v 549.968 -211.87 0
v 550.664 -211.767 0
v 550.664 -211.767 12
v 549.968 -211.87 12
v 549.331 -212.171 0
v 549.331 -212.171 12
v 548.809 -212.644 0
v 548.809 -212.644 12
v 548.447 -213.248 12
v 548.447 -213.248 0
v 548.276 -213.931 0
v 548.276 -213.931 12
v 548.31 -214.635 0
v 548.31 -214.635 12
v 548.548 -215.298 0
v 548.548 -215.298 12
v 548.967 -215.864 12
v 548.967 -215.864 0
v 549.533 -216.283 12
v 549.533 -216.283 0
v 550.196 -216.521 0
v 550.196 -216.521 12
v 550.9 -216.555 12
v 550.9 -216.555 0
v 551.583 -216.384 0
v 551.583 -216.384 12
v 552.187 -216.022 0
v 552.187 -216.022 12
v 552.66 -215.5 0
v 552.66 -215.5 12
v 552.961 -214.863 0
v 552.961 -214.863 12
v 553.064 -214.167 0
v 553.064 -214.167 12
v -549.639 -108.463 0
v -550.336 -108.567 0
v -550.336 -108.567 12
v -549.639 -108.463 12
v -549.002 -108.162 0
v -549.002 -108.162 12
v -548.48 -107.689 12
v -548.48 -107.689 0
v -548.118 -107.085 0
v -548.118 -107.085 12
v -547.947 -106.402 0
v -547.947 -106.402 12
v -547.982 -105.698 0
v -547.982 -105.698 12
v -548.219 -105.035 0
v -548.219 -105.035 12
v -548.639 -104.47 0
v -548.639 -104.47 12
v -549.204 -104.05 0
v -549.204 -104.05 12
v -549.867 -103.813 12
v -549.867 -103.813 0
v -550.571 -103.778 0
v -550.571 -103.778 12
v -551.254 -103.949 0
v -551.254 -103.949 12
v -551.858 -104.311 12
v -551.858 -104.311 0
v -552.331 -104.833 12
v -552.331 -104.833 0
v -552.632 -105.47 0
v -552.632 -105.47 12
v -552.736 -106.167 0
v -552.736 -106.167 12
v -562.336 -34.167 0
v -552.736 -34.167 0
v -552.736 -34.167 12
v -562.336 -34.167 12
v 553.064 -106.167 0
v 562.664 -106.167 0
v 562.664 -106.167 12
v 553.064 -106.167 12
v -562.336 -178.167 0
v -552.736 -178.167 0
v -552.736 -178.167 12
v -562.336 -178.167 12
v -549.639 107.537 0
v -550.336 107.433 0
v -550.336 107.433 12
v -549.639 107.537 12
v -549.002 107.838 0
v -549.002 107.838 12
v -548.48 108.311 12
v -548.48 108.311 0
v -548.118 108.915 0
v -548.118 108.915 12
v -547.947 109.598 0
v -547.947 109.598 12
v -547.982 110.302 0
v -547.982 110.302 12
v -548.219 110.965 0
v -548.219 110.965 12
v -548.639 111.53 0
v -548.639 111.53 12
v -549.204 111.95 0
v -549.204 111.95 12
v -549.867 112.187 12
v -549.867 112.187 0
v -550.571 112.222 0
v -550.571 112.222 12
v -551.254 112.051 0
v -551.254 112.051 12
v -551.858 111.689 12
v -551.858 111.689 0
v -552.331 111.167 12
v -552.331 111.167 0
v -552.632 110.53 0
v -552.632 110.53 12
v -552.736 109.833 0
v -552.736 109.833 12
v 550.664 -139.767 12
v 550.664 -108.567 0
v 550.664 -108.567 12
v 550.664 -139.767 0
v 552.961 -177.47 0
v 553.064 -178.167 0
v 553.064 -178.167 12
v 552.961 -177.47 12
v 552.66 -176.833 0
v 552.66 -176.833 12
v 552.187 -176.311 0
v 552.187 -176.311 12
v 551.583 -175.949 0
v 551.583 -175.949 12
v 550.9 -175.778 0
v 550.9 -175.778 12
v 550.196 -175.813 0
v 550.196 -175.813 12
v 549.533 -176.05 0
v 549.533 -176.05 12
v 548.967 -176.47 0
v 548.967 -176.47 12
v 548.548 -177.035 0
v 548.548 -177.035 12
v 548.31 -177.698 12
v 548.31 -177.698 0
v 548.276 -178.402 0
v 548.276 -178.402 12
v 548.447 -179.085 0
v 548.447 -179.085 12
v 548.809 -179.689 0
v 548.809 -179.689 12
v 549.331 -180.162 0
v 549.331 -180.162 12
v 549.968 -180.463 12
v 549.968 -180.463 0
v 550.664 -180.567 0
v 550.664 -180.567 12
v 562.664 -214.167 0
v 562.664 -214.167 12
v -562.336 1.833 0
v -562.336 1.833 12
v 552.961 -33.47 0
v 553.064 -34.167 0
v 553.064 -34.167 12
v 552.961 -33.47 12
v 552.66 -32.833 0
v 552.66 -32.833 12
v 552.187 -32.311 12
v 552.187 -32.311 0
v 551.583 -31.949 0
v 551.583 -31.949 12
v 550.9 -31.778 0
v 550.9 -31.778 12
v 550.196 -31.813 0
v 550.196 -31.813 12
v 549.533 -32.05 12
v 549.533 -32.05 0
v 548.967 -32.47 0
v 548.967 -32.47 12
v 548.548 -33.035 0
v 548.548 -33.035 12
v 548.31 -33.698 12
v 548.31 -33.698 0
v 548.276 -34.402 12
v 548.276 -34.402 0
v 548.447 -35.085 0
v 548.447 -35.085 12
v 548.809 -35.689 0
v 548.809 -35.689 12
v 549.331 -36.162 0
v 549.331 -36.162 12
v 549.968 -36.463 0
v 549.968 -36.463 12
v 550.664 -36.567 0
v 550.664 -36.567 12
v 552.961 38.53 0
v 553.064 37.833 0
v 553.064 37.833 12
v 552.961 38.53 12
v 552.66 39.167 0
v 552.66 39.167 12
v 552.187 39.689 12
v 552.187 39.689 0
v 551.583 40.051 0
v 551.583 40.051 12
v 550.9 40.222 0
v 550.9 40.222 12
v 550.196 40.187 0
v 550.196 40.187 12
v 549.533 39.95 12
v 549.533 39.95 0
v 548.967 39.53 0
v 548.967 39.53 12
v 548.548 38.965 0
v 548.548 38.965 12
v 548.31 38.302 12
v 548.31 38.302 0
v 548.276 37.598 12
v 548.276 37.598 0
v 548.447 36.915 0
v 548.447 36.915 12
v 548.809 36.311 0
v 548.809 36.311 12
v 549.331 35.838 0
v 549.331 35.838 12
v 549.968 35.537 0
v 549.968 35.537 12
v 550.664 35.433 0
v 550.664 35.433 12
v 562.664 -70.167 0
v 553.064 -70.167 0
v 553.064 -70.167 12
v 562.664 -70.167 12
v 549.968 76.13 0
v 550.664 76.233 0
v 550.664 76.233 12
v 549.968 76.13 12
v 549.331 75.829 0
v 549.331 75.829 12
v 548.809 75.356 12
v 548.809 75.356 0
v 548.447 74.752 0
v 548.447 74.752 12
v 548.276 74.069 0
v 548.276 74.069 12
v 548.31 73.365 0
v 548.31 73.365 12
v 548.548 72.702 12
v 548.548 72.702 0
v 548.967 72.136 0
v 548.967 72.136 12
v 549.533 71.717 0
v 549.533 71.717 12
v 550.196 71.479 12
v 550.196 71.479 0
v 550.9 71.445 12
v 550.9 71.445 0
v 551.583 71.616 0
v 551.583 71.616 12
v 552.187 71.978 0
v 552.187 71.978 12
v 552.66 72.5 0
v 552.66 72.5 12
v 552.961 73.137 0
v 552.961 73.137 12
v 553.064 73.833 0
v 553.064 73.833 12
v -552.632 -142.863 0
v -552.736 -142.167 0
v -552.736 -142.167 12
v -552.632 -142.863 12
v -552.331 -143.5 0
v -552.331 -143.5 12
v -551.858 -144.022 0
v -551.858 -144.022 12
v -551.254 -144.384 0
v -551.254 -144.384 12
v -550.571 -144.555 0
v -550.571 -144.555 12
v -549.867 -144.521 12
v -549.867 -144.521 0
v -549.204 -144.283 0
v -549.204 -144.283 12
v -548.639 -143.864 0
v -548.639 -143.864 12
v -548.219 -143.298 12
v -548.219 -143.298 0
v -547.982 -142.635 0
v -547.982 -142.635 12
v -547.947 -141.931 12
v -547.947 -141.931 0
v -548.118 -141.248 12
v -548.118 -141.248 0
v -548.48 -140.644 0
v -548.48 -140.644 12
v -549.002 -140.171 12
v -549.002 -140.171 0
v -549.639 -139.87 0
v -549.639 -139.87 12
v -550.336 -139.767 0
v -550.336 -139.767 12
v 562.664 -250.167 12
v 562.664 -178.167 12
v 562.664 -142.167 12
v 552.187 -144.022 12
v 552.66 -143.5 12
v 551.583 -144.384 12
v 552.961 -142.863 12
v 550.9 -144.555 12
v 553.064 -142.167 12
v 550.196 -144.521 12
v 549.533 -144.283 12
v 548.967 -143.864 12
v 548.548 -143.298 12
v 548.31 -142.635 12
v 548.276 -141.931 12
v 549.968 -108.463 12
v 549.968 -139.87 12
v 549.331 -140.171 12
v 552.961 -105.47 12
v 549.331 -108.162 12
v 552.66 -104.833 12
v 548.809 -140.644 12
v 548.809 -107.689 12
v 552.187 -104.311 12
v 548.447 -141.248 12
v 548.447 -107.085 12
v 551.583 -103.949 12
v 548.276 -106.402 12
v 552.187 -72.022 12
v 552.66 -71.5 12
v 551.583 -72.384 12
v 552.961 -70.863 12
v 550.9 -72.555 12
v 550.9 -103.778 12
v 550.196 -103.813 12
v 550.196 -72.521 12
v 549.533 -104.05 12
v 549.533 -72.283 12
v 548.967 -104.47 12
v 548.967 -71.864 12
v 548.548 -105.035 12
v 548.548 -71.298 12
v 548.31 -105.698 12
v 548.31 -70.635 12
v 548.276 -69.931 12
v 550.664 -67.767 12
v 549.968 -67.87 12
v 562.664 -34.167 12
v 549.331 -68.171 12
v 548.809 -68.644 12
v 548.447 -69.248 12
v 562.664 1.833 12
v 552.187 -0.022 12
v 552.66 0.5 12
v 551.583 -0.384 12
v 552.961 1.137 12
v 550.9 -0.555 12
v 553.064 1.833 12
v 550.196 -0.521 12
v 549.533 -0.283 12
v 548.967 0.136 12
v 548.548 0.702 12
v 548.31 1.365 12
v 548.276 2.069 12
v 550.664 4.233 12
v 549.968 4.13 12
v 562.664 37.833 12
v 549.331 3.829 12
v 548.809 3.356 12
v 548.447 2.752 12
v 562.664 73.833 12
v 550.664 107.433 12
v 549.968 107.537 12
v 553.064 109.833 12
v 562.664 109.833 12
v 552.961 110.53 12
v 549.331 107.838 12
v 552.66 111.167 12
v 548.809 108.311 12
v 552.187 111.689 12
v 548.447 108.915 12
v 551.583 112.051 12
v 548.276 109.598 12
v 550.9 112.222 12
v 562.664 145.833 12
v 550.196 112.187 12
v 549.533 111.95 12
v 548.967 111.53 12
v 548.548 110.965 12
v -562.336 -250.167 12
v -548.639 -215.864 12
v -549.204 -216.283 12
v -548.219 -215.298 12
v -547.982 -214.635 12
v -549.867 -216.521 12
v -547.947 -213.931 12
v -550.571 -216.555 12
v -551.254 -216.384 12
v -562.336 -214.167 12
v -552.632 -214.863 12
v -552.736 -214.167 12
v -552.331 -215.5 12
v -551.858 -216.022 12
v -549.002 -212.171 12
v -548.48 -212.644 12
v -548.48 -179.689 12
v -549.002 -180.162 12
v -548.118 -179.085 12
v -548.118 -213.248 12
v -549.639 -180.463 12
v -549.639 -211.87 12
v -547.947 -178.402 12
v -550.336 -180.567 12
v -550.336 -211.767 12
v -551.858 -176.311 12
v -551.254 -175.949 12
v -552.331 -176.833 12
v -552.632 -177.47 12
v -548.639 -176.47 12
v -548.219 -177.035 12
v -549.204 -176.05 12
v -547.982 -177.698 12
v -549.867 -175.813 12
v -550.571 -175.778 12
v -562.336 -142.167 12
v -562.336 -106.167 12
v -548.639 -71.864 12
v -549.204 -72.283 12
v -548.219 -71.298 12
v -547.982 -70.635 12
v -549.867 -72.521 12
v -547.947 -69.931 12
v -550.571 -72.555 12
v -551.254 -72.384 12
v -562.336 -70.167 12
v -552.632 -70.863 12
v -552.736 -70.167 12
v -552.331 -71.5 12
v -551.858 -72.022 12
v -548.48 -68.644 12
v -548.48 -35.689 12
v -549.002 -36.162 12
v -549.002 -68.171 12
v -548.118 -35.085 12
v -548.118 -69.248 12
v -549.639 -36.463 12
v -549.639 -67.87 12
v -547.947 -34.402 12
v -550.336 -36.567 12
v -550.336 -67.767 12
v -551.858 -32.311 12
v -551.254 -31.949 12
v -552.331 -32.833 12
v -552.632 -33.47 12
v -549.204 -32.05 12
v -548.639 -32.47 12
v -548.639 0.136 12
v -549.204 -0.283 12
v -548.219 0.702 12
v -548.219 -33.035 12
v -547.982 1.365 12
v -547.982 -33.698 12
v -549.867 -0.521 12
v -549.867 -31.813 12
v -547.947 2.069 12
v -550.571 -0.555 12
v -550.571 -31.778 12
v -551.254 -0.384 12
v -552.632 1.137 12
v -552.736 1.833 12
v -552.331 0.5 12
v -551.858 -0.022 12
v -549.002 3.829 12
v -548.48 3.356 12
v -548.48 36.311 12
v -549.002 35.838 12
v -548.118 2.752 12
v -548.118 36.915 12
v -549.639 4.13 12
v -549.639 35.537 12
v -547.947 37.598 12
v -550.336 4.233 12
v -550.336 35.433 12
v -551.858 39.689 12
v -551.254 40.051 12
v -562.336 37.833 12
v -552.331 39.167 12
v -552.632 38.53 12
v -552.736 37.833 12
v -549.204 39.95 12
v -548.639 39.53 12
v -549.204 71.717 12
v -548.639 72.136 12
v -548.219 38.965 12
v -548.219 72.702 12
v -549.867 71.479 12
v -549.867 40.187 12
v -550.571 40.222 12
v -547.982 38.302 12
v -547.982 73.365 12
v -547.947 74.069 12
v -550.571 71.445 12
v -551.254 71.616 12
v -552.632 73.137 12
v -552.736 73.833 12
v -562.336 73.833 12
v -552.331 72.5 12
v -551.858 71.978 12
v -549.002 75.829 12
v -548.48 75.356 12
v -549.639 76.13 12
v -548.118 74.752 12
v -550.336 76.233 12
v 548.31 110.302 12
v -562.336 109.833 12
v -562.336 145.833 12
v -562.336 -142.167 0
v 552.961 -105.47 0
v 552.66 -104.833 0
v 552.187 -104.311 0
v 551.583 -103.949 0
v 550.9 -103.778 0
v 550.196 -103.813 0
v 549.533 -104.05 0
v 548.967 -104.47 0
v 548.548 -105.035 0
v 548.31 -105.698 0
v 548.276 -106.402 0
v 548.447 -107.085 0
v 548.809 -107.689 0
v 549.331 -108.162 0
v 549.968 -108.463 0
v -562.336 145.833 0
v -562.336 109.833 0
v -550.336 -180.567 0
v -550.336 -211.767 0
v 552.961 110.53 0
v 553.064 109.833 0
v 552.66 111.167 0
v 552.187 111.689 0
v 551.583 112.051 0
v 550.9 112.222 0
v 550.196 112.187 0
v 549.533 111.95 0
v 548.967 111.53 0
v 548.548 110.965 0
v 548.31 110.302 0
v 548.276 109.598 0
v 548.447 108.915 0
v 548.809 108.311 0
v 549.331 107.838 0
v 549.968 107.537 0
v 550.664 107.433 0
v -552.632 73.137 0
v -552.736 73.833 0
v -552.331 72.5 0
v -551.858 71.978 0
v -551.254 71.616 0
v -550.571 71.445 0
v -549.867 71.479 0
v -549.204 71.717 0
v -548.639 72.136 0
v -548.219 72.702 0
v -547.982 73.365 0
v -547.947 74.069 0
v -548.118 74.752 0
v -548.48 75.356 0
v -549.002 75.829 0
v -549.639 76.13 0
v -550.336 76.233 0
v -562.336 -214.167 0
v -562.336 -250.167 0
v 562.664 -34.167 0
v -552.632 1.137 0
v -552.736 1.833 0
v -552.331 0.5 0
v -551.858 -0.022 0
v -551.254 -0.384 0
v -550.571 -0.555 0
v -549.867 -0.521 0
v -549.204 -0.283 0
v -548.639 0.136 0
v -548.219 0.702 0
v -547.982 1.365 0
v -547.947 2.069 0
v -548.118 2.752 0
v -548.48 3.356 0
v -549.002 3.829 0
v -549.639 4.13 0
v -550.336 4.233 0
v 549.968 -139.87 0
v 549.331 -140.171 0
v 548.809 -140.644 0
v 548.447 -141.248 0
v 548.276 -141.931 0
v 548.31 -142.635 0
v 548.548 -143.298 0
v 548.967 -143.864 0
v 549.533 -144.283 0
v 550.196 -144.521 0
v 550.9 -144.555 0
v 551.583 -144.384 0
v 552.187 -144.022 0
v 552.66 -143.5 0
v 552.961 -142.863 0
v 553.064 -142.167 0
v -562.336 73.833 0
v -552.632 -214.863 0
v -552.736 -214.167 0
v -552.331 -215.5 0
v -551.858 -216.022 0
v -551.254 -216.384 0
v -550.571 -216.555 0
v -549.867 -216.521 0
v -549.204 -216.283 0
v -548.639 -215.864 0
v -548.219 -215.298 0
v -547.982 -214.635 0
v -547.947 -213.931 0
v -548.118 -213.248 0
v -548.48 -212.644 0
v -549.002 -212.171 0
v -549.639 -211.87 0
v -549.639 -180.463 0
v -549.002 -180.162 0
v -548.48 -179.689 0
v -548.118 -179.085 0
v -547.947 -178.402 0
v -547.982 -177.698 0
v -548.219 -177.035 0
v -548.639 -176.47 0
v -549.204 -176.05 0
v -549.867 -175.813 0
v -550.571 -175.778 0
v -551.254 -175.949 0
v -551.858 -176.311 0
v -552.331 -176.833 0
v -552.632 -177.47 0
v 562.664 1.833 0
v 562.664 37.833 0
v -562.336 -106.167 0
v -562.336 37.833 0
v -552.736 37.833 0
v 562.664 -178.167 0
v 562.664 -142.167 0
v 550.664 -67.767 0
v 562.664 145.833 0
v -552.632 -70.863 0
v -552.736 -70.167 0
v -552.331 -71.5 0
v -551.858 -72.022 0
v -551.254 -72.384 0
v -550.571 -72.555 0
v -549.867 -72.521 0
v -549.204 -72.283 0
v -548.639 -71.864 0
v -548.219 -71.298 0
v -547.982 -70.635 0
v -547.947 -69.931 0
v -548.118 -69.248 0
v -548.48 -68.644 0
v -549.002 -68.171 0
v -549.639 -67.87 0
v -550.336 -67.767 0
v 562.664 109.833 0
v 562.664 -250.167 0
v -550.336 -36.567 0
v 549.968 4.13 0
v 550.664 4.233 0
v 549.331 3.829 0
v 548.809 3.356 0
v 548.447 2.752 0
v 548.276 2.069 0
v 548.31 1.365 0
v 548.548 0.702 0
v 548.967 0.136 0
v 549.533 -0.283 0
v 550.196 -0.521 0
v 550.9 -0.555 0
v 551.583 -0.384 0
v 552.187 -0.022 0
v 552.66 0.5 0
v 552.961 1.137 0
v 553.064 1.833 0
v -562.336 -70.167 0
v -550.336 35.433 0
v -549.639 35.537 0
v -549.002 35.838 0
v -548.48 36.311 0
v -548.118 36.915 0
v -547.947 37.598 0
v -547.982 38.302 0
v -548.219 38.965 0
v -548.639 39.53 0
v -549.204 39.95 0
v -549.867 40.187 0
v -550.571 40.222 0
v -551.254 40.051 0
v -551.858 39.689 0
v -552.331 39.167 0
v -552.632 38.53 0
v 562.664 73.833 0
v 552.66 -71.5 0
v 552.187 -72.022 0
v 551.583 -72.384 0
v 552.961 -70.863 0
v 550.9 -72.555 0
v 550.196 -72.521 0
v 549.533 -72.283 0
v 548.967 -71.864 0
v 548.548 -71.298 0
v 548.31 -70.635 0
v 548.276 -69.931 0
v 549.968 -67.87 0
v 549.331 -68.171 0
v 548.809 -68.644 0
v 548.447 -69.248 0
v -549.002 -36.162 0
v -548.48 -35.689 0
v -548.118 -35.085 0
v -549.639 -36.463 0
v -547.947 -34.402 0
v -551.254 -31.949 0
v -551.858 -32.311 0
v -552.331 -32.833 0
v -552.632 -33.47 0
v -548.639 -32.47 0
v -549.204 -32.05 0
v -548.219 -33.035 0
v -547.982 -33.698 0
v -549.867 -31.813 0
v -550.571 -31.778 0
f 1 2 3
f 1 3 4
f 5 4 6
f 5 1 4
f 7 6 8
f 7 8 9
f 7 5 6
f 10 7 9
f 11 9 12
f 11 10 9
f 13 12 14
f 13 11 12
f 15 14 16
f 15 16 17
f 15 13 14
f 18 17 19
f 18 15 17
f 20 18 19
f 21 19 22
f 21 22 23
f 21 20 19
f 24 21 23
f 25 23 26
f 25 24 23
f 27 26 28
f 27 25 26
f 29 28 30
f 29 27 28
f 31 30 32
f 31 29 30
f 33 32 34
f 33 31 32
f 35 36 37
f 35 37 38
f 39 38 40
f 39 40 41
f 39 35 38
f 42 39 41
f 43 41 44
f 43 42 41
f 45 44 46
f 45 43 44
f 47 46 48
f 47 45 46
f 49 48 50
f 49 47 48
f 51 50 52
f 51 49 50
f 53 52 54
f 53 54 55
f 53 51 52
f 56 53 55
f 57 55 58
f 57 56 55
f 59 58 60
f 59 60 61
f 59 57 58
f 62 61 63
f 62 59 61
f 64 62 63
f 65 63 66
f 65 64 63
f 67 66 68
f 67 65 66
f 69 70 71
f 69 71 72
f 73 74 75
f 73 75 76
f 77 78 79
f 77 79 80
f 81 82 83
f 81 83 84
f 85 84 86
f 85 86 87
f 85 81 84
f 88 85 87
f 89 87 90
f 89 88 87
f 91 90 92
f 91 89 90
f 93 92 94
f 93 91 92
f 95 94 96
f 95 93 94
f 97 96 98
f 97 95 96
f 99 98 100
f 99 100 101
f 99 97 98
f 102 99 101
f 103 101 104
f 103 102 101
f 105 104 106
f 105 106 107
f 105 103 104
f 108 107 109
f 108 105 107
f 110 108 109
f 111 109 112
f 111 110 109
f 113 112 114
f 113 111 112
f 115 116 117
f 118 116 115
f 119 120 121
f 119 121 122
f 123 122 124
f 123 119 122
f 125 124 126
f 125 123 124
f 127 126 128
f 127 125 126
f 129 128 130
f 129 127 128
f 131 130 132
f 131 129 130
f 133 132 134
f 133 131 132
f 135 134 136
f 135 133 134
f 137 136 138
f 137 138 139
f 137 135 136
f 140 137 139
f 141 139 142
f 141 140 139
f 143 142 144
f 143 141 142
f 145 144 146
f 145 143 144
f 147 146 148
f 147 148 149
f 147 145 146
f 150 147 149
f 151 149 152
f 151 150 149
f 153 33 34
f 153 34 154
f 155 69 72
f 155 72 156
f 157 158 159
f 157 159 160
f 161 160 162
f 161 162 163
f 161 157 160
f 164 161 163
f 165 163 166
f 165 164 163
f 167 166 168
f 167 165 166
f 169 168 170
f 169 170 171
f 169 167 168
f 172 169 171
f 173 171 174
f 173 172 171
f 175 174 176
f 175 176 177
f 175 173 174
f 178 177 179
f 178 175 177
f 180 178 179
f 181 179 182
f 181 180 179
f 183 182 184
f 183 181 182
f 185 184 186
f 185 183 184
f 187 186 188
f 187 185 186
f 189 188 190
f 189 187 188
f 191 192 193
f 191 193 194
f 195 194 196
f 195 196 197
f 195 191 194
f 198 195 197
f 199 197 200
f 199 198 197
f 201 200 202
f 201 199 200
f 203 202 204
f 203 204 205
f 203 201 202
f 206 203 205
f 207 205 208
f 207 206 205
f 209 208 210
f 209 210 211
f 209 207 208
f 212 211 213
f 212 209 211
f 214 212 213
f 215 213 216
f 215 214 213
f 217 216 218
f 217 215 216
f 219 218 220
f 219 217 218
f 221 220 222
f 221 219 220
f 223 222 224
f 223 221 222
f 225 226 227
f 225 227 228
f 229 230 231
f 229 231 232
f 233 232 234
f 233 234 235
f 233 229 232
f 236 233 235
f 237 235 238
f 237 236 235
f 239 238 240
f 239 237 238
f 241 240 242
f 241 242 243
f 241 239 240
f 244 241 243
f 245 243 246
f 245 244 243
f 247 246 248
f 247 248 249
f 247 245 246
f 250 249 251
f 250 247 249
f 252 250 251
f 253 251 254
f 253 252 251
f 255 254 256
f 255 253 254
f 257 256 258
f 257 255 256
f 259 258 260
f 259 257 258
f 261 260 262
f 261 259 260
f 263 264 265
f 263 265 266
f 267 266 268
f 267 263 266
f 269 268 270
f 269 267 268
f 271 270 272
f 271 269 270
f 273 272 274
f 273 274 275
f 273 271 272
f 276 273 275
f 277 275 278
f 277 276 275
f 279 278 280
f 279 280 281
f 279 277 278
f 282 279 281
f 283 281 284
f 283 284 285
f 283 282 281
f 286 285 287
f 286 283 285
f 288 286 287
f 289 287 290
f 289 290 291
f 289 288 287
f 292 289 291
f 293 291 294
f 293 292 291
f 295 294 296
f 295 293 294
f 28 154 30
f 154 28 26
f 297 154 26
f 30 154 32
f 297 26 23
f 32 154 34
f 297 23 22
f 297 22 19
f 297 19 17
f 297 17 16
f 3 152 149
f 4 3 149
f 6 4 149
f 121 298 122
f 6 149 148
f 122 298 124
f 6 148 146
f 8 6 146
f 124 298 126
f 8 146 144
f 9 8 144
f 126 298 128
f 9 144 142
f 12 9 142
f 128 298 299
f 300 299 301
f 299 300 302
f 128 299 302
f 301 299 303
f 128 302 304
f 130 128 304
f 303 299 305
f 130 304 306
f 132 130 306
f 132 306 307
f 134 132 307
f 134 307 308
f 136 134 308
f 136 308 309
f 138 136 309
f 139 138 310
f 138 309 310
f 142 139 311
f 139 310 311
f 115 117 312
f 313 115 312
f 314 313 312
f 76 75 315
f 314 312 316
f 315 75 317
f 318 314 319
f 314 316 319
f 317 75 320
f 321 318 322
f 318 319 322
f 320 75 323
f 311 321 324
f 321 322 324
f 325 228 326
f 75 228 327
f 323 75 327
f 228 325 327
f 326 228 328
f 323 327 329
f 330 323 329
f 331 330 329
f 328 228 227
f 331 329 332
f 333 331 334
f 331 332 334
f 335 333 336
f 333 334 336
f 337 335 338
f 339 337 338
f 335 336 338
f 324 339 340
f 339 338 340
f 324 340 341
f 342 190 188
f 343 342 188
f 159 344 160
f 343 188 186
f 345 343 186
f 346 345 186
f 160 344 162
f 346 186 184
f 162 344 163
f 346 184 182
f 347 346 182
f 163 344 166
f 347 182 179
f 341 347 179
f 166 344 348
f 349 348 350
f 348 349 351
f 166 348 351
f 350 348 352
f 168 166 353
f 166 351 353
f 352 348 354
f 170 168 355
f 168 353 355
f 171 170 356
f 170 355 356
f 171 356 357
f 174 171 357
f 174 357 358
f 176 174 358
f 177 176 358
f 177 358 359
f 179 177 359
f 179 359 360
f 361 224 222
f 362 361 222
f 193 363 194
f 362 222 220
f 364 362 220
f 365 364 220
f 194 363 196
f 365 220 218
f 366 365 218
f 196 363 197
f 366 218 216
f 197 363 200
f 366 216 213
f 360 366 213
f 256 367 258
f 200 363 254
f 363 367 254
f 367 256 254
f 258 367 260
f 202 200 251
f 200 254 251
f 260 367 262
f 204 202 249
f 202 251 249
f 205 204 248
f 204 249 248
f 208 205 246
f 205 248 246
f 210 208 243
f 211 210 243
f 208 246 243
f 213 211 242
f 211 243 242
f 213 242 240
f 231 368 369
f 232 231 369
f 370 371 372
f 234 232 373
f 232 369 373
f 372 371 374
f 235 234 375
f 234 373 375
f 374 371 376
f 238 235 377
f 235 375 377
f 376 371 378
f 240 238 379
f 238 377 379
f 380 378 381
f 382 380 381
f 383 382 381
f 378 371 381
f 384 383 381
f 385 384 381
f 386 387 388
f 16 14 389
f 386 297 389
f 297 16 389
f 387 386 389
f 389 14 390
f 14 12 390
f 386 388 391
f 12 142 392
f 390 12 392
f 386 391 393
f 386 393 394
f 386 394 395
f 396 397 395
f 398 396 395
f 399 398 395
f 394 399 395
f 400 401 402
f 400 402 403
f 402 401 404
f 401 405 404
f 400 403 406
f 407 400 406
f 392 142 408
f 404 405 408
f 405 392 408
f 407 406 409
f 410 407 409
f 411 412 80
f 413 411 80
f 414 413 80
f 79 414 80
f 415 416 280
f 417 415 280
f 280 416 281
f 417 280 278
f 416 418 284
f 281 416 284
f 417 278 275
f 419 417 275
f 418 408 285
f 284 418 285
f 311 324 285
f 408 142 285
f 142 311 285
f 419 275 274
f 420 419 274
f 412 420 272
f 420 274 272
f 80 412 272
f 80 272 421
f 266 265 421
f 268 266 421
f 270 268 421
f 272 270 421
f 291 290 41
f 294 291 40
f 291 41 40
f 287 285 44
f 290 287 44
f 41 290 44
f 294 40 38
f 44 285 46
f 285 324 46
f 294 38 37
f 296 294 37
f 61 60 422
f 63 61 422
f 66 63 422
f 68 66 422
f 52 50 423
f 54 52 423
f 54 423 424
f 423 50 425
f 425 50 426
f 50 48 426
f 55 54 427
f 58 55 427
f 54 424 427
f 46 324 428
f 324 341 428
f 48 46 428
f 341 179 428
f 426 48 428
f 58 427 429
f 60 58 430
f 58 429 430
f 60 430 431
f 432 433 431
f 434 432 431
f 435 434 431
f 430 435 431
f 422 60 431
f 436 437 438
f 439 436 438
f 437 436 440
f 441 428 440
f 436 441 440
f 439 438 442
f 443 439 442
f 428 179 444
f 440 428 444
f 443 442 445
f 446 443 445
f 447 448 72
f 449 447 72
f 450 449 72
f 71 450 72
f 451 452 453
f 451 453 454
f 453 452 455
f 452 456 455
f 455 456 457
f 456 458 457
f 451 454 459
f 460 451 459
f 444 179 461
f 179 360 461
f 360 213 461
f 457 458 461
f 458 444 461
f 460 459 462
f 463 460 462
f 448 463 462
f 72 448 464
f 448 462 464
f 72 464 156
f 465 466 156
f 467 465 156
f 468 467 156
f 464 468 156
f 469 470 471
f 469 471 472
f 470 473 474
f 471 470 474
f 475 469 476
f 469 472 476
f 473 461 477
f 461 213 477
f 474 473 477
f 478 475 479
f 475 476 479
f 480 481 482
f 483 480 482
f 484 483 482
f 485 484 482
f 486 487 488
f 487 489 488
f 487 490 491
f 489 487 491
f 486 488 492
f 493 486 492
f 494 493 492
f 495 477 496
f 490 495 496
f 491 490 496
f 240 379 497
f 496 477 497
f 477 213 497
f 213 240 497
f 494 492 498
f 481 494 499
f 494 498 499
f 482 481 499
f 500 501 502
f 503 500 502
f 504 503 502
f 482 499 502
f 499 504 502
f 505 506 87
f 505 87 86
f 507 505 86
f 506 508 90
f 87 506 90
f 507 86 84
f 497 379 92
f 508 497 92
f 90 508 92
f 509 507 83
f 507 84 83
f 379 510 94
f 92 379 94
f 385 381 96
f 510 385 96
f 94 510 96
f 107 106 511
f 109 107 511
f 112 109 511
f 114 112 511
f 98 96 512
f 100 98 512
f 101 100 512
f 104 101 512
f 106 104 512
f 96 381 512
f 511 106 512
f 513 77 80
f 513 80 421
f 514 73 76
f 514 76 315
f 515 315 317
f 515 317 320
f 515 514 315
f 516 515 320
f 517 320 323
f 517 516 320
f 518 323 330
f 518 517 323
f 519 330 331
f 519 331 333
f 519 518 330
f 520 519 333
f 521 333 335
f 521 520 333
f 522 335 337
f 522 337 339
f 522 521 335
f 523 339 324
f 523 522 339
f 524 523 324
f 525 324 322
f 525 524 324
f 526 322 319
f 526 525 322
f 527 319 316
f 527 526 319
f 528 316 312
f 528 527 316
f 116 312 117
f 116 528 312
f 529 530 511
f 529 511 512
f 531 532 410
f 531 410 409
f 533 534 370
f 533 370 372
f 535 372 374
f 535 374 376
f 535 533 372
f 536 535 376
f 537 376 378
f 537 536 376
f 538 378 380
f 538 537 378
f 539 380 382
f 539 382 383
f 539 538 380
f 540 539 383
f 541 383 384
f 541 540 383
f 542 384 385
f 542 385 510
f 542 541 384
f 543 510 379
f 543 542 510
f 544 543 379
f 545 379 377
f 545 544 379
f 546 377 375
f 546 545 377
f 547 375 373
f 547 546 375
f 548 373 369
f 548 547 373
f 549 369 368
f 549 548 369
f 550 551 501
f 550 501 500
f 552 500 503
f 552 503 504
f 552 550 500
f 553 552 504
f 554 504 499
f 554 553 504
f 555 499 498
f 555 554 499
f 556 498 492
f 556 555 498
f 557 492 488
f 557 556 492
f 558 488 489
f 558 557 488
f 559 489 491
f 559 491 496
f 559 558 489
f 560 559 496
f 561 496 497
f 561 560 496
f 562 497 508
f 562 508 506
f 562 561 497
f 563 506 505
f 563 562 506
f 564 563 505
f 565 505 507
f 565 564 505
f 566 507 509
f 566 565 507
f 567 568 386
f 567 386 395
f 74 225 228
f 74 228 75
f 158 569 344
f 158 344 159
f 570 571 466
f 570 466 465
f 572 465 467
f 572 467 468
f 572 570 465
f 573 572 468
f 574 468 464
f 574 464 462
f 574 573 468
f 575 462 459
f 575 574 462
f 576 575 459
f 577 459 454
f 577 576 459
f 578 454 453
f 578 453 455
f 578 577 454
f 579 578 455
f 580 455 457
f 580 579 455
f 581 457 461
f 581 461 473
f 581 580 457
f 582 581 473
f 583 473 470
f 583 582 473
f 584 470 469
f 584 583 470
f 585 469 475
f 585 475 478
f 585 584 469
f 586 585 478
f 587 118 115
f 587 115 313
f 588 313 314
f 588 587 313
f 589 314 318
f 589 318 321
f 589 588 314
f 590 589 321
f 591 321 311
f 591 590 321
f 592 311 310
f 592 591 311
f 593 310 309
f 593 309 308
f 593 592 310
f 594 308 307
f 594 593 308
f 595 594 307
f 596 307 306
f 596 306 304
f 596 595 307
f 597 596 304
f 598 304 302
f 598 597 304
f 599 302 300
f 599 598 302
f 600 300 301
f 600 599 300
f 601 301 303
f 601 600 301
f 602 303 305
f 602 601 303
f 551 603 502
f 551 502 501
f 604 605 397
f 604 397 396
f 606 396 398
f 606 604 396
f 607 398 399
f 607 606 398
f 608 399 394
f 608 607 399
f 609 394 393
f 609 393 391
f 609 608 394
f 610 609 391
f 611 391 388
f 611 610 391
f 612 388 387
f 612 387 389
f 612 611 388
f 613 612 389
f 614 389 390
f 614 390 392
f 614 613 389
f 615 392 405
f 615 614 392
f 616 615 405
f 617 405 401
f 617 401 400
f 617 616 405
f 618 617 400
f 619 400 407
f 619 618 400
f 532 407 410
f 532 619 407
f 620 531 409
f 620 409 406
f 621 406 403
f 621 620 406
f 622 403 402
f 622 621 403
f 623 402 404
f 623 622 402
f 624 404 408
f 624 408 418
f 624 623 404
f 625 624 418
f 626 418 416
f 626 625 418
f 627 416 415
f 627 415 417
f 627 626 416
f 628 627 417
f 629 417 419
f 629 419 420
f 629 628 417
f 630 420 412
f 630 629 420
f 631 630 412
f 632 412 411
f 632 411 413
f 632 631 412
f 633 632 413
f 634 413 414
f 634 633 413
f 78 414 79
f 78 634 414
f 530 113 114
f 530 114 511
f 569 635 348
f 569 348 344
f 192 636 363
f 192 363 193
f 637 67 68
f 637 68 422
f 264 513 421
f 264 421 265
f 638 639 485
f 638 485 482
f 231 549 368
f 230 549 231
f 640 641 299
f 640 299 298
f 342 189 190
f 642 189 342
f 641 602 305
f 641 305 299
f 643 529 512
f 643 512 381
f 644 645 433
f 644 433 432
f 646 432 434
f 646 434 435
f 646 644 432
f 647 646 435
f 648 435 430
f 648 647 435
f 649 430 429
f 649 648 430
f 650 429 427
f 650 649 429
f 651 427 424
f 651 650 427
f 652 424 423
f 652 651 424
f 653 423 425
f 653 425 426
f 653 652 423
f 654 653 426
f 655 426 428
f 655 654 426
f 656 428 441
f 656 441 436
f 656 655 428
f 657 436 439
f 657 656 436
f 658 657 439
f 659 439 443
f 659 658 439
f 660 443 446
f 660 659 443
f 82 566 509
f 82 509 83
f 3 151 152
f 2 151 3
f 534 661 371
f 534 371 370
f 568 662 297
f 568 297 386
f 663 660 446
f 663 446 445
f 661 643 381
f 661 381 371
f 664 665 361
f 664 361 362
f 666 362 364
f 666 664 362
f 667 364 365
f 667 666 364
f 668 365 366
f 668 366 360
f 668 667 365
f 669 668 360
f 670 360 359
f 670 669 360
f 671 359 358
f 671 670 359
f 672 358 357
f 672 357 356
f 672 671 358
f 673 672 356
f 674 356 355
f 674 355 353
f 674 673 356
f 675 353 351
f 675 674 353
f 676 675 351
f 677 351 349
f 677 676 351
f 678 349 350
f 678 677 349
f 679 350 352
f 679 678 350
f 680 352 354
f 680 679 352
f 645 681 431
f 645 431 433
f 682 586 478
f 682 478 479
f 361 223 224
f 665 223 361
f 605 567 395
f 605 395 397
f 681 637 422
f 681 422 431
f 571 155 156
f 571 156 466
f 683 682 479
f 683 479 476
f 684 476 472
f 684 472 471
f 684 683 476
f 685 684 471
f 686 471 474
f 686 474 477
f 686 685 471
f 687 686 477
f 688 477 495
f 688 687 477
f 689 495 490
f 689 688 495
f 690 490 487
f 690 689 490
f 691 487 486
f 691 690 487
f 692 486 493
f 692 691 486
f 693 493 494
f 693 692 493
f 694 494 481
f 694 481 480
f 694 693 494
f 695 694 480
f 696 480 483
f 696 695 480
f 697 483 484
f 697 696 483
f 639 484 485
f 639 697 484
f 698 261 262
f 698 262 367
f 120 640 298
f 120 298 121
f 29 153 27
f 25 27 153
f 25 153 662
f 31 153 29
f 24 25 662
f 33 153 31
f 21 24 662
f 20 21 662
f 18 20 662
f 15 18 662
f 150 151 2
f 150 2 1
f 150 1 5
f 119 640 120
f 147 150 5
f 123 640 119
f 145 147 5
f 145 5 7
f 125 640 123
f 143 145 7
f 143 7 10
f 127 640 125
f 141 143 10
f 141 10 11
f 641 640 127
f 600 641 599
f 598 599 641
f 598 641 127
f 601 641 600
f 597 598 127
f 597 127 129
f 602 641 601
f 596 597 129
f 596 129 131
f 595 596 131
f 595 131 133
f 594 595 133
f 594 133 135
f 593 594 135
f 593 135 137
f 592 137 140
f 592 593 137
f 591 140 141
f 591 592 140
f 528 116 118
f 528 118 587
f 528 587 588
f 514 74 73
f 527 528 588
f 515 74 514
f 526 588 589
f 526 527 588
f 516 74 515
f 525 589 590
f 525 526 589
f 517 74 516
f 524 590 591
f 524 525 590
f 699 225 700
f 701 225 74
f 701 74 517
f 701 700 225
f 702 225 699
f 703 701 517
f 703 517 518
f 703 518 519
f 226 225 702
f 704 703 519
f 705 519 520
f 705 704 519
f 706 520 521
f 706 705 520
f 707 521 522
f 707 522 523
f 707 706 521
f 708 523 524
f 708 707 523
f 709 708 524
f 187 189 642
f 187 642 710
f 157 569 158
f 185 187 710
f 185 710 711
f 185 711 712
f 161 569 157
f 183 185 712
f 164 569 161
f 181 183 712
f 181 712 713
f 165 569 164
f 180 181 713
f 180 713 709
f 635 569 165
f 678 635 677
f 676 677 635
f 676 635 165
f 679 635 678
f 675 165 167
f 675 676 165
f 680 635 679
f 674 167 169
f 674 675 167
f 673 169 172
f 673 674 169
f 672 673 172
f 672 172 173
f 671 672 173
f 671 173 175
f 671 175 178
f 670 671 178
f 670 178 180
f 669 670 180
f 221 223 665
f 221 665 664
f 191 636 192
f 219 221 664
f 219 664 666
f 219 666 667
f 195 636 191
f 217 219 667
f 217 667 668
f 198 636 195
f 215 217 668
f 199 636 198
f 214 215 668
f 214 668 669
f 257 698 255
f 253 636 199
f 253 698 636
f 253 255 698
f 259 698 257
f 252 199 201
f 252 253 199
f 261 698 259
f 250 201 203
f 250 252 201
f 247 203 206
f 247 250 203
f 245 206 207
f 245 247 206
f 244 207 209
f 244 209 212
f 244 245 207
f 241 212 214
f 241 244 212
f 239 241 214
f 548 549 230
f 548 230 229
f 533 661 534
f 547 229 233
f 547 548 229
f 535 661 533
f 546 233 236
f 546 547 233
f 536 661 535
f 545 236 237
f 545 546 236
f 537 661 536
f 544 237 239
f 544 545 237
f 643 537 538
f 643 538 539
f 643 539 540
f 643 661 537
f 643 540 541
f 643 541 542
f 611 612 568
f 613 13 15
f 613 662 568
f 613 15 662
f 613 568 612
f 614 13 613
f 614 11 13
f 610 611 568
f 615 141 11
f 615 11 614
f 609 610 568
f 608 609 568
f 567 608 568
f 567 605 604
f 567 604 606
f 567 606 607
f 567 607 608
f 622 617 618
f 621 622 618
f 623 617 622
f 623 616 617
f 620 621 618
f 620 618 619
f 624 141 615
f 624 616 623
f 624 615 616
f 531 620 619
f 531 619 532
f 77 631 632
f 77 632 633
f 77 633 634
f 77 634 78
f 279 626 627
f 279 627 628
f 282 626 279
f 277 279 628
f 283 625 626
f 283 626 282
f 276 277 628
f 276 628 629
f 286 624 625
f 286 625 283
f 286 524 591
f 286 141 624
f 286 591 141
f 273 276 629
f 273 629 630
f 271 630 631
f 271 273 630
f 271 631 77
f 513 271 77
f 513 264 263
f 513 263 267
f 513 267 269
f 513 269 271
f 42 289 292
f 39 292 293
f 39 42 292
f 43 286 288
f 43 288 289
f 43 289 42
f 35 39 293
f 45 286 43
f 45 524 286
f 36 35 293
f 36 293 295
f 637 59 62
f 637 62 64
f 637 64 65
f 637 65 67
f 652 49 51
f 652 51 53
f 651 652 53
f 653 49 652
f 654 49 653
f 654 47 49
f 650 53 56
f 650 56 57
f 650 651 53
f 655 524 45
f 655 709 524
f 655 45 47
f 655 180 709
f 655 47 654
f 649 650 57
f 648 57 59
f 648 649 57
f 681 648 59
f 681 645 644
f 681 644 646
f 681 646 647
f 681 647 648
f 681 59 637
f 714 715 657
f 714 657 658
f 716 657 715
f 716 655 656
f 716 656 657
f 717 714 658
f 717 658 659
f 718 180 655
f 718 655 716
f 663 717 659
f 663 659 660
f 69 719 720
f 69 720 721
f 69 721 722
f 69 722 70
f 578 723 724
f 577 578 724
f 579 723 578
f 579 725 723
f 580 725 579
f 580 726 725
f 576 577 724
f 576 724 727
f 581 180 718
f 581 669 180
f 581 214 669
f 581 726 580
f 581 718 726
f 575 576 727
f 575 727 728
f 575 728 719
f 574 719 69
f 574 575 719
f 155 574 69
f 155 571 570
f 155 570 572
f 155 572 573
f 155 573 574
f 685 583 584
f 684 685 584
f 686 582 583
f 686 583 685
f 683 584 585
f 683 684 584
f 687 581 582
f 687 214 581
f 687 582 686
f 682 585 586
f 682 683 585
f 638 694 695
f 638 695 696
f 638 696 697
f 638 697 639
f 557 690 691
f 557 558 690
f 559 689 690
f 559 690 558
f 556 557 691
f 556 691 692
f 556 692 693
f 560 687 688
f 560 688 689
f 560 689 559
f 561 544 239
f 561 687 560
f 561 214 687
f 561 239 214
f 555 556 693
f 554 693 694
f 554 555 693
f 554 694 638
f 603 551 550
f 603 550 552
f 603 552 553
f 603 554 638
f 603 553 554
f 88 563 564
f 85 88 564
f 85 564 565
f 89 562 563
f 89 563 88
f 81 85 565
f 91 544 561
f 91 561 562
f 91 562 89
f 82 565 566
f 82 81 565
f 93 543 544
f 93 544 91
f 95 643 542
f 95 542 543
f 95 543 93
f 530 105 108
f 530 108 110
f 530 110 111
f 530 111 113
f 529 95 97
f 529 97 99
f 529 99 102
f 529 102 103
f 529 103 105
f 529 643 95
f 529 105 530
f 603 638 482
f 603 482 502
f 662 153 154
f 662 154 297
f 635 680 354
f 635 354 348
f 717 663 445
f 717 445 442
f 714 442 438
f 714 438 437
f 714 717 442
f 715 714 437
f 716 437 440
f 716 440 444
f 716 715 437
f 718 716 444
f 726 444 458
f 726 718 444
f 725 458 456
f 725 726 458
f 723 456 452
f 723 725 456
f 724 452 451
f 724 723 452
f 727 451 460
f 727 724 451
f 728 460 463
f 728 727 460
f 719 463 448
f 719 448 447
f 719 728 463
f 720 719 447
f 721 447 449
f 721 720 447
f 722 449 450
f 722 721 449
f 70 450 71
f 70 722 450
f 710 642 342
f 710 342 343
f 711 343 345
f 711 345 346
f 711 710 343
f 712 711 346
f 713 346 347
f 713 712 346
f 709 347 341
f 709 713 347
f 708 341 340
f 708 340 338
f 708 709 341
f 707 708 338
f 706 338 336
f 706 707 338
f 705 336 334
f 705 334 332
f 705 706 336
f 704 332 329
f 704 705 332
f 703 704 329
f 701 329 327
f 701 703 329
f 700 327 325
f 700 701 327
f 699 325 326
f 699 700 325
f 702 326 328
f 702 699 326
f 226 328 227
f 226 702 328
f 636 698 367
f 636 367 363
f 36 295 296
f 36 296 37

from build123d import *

# Parameters (mm, degrees)
BOSS_EXTRUDE1_DEPTH = 12


with BuildPart() as part:
    # Sketch1 → Boss-Extrude1 (new body)
    with BuildSketch(Plane.XY):
        with BuildLine():
            Line((562.664353911, 109.833333333), (553.064353911, 109.833333333))
            ThreePointArc((553.064353911, 109.833333333), (548.967297637, 111.530389608), (550.664353911, 107.433333333))
            Line((550.664353911, 107.433333333), (550.664353911, 76.233333333))
            ThreePointArc((550.664353911, 76.233333333), (548.967297637, 72.136277058), (553.064353911, 73.833333333))
            Line((553.064353911, 73.833333333), (562.664353911, 73.833333333))
            Line((562.664353911, 73.833333333), (562.664353911, 37.833333333))
            Line((562.664353911, 37.833333333), (553.064353911, 37.833333333))
            ThreePointArc((553.064353911, 37.833333333), (548.967297637, 39.530389608), (550.664353911, 35.433333333))
            Line((550.664353911, 35.433333333), (550.664353911, 4.233333333))
            ThreePointArc((550.664353911, 4.233333333), (548.967297637, 0.136277058), (553.064353911, 1.833333333))
            Line((553.064353911, 1.833333333), (562.664353911, 1.833333333))
            Line((562.664353911, 1.833333333), (562.664353911, -34.166666667))
            Line((562.664353911, -34.166666667), (553.064353911, -34.166666667))
            ThreePointArc((553.064353911, -34.166666667), (548.967297637, -32.469610392), (550.664353911, -36.566666667))
            Line((550.664353911, -36.566666667), (550.664353911, -67.766666667))
            ThreePointArc((550.664353911, -67.766666667), (548.967297637, -71.863722942), (553.064353911, -70.166666667))
            Line((553.064353911, -70.166666667), (562.664353911, -70.166666667))
            Line((562.664353911, -70.166666667), (562.664353911, -106.166666667))
            Line((562.664353911, -106.166666667), (553.064353911, -106.166666667))
            ThreePointArc((553.064353911, -106.166666667), (548.967297637, -104.469610392), (550.664353911, -108.566666667))
            Line((550.664353911, -108.566666667), (550.664353911, -139.766666667))
            ThreePointArc((550.664353911, -139.766666667), (548.967297637, -143.863722942), (553.064353911, -142.166666667))
            Line((553.064353911, -142.166666667), (562.664353911, -142.166666667))
            Line((562.664353911, -142.166666667), (562.664353911, -178.166666667))
            Line((562.664353911, -178.166666667), (553.064353911, -178.166666667))
            ThreePointArc((553.064353911, -178.166666667), (548.967297637, -176.469610392), (550.664353911, -180.566666667))
            Line((550.664353911, -180.566666667), (550.664353911, -211.766666667))
            ThreePointArc((550.664353911, -211.766666667), (548.967297637, -215.863722942), (553.064353911, -214.166666667))
            Line((553.064353911, -214.166666667), (562.664353911, -214.166666667))
            Line((562.664353911, -214.166666667), (562.664353911, -250.166666667))
            Line((562.664353911, -250.166666667), (-562.335646089, -250.166666667))
            Line((-562.335646089, -250.166666667), (-562.335646089, -214.166666667))
            Line((-562.335646089, -214.166666667), (-552.735646089, -214.166666667))
            ThreePointArc((-552.735646089, -214.166666667), (-548.638589814, -215.863722942), (-550.335646089, -211.766666667))
            Line((-550.335646089, -211.766666667), (-550.335646089, -180.566666667))
            ThreePointArc((-550.335646089, -180.566666667), (-548.638589814, -176.469610392), (-552.735646089, -178.166666667))
            Line((-552.735646089, -178.166666667), (-562.335646089, -178.166666667))
            Line((-562.335646089, -178.166666667), (-562.335646089, -142.166666667))
            Line((-562.335646089, -142.166666667), (-552.735646089, -142.166666667))
            ThreePointArc((-552.735646089, -142.166666667), (-548.638589814, -143.863722942), (-550.335646089, -139.766666667))
            Line((-550.335646089, -139.766666667), (-550.335646089, -108.566666667))
            ThreePointArc((-550.335646089, -108.566666667), (-548.638589814, -104.469610392), (-552.735646089, -106.166666667))
            Line((-552.735646089, -106.166666667), (-562.335646089, -106.166666667))
            Line((-562.335646089, -106.166666667), (-562.335646089, -70.166666667))
            Line((-562.335646089, -70.166666667), (-552.735646089, -70.166666667))
            ThreePointArc((-552.735646089, -70.166666667), (-548.638589814, -71.863722942), (-550.335646089, -67.766666667))
            Line((-550.335646089, -67.766666667), (-550.335646089, -36.566666667))
            ThreePointArc((-550.335646089, -36.566666667), (-548.638589814, -32.469610392), (-552.735646089, -34.166666667))
            Line((-552.735646089, -34.166666667), (-562.335646089, -34.166666667))
            Line((-562.335646089, -34.166666667), (-562.335646089, 1.833333333))
            Line((-562.335646089, 1.833333333), (-552.735646089, 1.833333333))
            ThreePointArc((-552.735646089, 1.833333333), (-548.638589814, 0.136277058), (-550.335646089, 4.233333333))
            Line((-550.335646089, 4.233333333), (-550.335646089, 35.433333333))
            ThreePointArc((-550.335646089, 35.433333333), (-548.638589814, 39.530389608), (-552.735646089, 37.833333333))
            Line((-552.735646089, 37.833333333), (-562.335646089, 37.833333333))
            Line((-562.335646089, 37.833333333), (-562.335646089, 73.833333333))
            Line((-562.335646089, 73.833333333), (-552.735646089, 73.833333333))
            ThreePointArc((-552.735646089, 73.833333333), (-548.638589814, 72.136277058), (-550.335646089, 76.233333333))
            Line((-550.335646089, 76.233333333), (-550.335646089, 107.433333333))
            ThreePointArc((-550.335646089, 107.433333333), (-548.638589814, 111.530389608), (-552.735646089, 109.833333333))
            Line((-552.735646089, 109.833333333), (-562.335646089, 109.833333333))
            Line((-562.335646089, 109.833333333), (-562.335646089, 145.833333333))
            Line((-562.335646089, 145.833333333), (562.664353911, 145.833333333))
            Line((562.664353911, 145.833333333), (562.664353911, 109.833333333))
        make_face()
    extrude(amount=BOSS_EXTRUDE1_DEPTH)


solid = part.part
